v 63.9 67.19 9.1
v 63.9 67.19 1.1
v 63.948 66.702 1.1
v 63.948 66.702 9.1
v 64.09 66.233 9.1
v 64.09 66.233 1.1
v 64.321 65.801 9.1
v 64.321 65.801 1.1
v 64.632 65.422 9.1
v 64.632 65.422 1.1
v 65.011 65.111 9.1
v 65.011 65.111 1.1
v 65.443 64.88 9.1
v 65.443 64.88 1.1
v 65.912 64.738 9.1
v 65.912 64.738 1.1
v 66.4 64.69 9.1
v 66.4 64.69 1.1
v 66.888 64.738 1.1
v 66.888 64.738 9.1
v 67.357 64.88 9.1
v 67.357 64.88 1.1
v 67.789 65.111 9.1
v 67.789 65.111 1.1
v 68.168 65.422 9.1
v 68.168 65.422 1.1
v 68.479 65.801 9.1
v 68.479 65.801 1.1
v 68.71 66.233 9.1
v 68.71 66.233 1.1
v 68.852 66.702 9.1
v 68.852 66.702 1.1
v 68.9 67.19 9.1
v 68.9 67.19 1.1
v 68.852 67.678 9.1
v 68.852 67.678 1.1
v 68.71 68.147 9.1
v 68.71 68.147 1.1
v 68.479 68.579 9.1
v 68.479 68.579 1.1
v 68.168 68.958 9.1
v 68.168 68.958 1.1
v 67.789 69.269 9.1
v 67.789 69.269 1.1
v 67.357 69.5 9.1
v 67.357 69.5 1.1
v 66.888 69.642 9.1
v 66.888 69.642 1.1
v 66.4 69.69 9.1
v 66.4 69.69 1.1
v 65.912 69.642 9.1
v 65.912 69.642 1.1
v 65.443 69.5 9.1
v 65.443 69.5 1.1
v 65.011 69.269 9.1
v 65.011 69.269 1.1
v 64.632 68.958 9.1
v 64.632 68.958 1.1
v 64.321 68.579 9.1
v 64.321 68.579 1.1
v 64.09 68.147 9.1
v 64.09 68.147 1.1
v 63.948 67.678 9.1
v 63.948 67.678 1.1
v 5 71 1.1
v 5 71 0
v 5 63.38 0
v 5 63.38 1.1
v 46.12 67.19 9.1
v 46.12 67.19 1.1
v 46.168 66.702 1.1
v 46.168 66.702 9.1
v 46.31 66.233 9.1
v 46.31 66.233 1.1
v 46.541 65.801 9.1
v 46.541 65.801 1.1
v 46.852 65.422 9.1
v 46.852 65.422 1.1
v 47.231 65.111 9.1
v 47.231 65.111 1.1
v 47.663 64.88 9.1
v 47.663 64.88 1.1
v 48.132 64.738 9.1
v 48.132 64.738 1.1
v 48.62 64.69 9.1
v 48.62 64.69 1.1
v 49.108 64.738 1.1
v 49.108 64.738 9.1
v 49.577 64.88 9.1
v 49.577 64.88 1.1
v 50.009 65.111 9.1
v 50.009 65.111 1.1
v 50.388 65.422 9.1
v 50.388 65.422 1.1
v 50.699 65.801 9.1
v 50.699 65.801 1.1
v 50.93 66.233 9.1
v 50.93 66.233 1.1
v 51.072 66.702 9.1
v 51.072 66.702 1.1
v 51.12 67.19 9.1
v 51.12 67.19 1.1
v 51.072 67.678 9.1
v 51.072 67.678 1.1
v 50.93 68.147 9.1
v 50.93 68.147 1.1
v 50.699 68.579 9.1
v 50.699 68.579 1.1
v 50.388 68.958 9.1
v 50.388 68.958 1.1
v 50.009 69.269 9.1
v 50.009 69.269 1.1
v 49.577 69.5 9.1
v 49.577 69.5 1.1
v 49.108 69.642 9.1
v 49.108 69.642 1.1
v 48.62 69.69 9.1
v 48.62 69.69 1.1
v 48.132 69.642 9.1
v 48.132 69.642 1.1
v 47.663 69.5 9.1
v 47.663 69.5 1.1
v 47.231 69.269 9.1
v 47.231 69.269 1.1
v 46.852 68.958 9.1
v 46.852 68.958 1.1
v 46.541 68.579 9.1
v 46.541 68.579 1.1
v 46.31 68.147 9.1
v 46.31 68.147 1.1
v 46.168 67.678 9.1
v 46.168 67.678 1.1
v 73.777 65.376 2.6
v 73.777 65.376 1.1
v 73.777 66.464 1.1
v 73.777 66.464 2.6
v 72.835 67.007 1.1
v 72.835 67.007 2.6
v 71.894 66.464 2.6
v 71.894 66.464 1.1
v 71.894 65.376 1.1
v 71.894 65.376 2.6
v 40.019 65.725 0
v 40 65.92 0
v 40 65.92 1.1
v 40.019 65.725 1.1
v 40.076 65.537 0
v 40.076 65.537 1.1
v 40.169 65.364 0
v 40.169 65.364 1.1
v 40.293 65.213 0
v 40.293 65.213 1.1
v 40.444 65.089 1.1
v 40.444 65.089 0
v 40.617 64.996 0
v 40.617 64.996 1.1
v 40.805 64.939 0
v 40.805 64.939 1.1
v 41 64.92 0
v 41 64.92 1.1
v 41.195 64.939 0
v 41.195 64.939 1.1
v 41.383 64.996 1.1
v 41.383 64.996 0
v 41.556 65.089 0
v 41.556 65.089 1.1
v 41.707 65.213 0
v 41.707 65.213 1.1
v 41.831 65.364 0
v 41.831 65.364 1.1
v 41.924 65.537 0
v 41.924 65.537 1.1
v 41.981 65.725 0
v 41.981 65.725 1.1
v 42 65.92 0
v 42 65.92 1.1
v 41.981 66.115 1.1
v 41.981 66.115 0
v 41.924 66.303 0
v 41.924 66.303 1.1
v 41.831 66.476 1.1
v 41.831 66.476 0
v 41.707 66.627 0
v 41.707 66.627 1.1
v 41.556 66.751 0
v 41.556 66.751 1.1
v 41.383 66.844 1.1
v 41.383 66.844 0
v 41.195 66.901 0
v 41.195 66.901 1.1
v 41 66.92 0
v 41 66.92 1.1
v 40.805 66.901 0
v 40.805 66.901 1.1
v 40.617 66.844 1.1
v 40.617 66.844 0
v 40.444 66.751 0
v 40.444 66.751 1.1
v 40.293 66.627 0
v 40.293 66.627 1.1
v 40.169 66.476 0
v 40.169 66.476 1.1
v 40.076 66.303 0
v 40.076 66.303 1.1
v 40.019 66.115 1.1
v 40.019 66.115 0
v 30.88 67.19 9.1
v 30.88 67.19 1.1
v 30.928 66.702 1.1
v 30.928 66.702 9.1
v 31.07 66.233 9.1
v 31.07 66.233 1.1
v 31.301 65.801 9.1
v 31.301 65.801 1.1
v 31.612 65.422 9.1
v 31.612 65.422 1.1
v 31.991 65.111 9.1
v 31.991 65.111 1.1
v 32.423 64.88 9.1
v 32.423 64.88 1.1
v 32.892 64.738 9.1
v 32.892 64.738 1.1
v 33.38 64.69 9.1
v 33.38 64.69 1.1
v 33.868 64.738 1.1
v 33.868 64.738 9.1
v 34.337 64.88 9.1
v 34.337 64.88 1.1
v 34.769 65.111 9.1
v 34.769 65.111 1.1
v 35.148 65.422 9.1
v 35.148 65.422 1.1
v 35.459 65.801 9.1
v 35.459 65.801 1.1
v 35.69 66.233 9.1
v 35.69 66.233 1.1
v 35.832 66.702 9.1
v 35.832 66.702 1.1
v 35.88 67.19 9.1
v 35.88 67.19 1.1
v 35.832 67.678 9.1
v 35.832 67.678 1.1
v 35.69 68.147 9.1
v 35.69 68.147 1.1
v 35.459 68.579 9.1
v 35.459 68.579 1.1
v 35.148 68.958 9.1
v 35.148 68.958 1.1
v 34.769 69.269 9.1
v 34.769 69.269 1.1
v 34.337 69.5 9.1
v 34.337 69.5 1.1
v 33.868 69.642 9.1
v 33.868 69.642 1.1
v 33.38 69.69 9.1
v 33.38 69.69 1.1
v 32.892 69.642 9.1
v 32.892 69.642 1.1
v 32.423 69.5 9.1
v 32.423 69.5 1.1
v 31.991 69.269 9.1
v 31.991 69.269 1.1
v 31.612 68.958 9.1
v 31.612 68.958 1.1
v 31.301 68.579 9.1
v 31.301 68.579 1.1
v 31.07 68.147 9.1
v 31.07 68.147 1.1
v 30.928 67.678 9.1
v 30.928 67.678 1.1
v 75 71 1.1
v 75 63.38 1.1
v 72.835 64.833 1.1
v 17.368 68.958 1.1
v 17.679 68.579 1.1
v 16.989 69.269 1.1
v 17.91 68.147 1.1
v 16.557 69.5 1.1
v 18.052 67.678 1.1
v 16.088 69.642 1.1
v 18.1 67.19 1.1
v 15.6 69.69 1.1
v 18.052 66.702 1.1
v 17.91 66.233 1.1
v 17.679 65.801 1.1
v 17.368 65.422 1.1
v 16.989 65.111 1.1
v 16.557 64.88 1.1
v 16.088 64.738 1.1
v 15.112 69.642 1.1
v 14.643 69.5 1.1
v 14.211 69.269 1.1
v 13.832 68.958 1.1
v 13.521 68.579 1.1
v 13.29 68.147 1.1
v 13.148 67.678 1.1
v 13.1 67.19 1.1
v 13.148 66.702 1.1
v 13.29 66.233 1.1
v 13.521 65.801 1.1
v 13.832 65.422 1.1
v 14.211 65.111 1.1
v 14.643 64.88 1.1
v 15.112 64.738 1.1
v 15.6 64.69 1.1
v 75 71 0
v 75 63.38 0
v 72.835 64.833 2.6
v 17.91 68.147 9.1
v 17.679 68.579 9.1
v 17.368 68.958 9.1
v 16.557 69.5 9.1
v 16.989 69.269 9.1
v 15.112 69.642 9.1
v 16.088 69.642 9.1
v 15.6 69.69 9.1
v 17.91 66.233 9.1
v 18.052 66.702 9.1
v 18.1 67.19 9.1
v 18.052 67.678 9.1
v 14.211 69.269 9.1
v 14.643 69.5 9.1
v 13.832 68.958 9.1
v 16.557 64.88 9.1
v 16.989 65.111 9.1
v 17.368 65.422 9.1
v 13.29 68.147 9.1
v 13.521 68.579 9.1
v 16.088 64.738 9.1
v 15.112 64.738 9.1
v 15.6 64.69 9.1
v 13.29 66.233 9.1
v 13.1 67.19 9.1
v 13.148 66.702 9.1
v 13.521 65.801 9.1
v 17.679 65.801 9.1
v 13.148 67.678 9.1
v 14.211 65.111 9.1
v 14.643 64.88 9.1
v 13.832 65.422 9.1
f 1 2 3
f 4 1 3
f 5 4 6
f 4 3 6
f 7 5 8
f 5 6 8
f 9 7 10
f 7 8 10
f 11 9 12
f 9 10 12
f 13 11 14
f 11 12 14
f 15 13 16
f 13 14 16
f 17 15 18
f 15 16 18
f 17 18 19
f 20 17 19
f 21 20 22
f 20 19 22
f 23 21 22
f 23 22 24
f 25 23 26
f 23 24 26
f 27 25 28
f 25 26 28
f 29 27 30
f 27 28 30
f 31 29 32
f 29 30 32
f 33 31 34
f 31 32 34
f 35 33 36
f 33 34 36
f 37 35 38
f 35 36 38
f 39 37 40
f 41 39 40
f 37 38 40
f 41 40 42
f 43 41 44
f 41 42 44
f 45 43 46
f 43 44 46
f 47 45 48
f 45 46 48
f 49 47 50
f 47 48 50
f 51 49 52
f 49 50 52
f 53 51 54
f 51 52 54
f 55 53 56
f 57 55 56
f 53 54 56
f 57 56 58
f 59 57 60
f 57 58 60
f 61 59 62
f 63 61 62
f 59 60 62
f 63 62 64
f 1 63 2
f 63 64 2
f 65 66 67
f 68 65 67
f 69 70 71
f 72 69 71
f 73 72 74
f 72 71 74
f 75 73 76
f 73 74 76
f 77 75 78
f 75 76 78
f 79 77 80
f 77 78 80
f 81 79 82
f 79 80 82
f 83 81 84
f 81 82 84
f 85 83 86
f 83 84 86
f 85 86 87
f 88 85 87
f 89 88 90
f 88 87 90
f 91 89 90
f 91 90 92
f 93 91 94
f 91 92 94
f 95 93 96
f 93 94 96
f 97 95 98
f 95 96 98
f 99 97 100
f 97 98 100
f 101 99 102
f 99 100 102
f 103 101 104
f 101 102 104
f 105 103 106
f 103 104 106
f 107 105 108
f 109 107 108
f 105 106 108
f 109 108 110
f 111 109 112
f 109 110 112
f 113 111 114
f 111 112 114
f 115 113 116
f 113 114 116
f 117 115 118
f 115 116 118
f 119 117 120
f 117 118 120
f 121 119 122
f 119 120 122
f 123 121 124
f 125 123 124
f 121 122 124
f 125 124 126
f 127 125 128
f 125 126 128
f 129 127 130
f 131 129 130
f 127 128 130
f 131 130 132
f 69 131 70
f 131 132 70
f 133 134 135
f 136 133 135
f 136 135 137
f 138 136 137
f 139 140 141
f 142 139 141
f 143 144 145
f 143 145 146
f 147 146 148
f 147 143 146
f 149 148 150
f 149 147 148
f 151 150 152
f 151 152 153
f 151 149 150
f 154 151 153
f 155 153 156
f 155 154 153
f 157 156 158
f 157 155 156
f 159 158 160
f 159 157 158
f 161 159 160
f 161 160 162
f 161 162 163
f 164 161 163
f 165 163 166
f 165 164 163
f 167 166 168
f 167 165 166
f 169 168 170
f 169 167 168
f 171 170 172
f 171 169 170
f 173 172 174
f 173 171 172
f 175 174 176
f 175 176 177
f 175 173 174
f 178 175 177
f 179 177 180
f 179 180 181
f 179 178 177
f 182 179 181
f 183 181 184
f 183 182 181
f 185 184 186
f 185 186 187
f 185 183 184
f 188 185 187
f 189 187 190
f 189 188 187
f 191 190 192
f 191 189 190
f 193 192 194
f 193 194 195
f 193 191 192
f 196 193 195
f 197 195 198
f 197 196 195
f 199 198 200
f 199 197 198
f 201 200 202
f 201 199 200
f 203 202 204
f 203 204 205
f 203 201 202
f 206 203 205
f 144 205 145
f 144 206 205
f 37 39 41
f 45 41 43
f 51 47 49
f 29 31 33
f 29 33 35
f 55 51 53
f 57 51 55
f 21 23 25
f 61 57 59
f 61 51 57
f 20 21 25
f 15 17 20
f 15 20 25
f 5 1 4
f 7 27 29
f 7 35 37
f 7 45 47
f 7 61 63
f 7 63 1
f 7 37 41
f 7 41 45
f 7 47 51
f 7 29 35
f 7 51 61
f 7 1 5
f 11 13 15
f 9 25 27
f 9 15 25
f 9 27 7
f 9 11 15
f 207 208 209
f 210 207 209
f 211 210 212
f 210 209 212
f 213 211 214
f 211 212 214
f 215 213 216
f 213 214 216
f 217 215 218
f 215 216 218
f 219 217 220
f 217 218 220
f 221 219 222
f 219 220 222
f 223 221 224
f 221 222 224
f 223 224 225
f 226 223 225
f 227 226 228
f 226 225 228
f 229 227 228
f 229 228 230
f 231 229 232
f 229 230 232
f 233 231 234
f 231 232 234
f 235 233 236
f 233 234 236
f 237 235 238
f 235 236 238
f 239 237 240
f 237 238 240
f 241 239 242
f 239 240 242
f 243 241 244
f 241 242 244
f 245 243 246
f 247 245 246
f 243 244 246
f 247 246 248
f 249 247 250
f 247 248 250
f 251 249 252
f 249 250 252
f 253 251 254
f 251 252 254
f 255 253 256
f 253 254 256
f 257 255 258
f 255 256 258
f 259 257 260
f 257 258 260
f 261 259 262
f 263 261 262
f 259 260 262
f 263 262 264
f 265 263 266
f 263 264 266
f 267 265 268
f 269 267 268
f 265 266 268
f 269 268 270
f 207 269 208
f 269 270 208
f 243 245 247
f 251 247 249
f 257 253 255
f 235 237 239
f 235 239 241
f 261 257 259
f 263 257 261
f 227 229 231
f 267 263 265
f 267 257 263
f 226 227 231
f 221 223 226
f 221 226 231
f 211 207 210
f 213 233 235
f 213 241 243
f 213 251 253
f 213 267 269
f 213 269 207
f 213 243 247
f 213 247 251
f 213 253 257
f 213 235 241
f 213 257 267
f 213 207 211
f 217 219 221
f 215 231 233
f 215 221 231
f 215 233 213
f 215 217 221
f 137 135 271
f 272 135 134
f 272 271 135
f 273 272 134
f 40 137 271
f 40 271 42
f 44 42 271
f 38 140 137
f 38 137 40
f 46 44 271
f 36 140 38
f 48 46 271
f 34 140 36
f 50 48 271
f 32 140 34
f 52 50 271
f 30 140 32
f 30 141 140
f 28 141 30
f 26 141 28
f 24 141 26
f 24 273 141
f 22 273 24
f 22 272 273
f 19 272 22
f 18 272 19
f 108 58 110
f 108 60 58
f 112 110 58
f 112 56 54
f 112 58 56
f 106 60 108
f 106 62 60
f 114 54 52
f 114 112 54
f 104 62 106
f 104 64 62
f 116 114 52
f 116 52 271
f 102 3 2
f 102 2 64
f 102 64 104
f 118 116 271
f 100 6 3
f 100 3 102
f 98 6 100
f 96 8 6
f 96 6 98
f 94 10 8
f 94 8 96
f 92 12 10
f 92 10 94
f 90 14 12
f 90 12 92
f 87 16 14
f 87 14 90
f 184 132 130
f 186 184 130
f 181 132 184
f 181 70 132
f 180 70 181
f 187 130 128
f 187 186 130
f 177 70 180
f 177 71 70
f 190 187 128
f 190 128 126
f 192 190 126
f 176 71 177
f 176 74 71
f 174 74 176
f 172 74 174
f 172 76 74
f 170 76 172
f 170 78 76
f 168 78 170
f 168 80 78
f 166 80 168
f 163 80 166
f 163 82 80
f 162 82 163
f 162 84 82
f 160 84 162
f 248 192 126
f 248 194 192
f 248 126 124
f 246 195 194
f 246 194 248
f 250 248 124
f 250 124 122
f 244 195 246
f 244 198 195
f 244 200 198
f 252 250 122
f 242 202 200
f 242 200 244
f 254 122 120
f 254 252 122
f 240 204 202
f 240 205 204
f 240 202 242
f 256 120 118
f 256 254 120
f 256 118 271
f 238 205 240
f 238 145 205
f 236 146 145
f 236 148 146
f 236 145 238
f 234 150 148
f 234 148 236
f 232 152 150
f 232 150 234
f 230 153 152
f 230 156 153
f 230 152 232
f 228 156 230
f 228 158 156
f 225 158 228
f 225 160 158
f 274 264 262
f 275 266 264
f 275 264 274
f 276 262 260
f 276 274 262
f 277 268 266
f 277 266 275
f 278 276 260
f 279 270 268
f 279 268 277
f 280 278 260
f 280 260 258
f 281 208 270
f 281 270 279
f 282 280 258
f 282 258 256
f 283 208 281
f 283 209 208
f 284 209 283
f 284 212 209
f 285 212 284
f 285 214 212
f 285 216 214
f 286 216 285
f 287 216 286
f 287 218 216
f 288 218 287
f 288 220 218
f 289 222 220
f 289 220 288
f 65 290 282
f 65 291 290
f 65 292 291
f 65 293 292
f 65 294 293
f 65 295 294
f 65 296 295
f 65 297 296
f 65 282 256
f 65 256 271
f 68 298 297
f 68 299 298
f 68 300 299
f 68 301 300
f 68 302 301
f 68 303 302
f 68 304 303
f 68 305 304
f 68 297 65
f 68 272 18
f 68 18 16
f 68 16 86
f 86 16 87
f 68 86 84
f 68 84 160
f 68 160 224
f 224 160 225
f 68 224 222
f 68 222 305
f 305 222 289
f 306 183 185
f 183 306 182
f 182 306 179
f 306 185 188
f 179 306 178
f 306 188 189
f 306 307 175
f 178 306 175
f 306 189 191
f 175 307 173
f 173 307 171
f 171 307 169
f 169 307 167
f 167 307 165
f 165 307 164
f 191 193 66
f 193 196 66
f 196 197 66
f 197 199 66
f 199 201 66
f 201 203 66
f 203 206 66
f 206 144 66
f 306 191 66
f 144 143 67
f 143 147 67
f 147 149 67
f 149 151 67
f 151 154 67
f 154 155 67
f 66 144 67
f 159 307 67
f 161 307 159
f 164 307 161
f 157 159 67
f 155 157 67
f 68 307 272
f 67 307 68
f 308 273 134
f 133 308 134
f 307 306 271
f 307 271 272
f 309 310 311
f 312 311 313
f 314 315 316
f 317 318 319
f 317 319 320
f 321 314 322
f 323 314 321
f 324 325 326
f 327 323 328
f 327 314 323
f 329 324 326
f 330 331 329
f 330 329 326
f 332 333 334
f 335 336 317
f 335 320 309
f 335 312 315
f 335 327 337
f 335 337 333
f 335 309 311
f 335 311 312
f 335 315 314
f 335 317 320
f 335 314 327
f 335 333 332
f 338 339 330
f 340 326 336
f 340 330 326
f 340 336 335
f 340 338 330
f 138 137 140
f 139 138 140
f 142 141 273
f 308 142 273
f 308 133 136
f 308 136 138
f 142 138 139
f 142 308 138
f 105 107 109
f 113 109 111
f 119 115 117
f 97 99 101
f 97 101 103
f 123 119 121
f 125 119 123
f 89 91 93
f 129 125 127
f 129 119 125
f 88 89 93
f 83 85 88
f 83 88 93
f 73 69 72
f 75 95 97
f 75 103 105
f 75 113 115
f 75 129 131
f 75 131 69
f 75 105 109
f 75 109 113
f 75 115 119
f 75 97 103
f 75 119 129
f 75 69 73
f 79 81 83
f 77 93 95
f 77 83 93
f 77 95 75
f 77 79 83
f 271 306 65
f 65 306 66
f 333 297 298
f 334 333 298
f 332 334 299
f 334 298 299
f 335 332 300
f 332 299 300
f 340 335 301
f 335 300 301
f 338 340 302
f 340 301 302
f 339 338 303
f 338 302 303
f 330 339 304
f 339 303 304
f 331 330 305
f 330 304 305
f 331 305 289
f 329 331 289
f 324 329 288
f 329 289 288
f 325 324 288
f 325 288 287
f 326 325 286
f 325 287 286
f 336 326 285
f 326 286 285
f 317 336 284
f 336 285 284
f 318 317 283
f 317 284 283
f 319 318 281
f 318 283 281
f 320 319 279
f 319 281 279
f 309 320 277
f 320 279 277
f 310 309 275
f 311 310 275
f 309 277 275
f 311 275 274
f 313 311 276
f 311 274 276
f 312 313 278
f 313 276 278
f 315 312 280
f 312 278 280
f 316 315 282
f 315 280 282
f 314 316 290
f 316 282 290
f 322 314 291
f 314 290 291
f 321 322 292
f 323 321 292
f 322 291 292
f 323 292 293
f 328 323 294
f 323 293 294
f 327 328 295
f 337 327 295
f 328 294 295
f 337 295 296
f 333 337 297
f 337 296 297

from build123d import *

# Parameters (mm, degrees)
SKETCH029_W             = 70
SKETCH029_H             = 7.62
SKETCH029_R             = 1
PAD017_DEPTH            = 1.1
SKETCH033_R             = 2.5
PAD021_DEPTH            = 8
PAD015_DEPTH            = 1.5
BODY007_PLACEMENT_ANGLE = 180


with BuildPart() as part:
    # Sketch029 → Pad017 (new body)
    with BuildSketch(Plane.XY):
        with Locations((35, 3.81)):
            Rectangle(SKETCH029_W, SKETCH029_H)
        with Locations((34, 5.08)):
            Circle(SKETCH029_R, mode=Mode.SUBTRACT)
    extrude(amount=PAD017_DEPTH)

    # Sketch033 (on Face7 of Pad017) → Pad021 (join)
    with BuildSketch(Plane.XY.offset(1.1)):
        with Locations((26.38, 3.81)):
            Circle(SKETCH033_R)
        with Locations((41.62, 3.81)):
            Circle(SKETCH033_R)
        with Locations((59.4, 3.81)):
            Circle(SKETCH033_R)
        with Locations((8.6, 3.81)):
            Circle(SKETCH033_R)
    extrude(amount=PAD021_DEPTH)

    # Sketch025 (on Face5 of Pad021) → Pad015 (join)
    with BuildSketch(Plane.XY.offset(1.1)):
        Polygon((3.106141, 4.536354), (3.106141, 5.623646), (2.164519, 6.167292), (1.222896, 5.623646), (1.222896, 4.536354), (2.164519, 3.992708), align=None)
    extrude(amount=PAD015_DEPTH)


with BuildPart() as part_1:
    # Body007 placement: moved
    add(part.part.moved(Location((75, 71, 0))).rotate(Axis((75, 71, 0), (0, 0, 1)), BODY007_PLACEMENT_ANGLE))


solid = part_1.part
